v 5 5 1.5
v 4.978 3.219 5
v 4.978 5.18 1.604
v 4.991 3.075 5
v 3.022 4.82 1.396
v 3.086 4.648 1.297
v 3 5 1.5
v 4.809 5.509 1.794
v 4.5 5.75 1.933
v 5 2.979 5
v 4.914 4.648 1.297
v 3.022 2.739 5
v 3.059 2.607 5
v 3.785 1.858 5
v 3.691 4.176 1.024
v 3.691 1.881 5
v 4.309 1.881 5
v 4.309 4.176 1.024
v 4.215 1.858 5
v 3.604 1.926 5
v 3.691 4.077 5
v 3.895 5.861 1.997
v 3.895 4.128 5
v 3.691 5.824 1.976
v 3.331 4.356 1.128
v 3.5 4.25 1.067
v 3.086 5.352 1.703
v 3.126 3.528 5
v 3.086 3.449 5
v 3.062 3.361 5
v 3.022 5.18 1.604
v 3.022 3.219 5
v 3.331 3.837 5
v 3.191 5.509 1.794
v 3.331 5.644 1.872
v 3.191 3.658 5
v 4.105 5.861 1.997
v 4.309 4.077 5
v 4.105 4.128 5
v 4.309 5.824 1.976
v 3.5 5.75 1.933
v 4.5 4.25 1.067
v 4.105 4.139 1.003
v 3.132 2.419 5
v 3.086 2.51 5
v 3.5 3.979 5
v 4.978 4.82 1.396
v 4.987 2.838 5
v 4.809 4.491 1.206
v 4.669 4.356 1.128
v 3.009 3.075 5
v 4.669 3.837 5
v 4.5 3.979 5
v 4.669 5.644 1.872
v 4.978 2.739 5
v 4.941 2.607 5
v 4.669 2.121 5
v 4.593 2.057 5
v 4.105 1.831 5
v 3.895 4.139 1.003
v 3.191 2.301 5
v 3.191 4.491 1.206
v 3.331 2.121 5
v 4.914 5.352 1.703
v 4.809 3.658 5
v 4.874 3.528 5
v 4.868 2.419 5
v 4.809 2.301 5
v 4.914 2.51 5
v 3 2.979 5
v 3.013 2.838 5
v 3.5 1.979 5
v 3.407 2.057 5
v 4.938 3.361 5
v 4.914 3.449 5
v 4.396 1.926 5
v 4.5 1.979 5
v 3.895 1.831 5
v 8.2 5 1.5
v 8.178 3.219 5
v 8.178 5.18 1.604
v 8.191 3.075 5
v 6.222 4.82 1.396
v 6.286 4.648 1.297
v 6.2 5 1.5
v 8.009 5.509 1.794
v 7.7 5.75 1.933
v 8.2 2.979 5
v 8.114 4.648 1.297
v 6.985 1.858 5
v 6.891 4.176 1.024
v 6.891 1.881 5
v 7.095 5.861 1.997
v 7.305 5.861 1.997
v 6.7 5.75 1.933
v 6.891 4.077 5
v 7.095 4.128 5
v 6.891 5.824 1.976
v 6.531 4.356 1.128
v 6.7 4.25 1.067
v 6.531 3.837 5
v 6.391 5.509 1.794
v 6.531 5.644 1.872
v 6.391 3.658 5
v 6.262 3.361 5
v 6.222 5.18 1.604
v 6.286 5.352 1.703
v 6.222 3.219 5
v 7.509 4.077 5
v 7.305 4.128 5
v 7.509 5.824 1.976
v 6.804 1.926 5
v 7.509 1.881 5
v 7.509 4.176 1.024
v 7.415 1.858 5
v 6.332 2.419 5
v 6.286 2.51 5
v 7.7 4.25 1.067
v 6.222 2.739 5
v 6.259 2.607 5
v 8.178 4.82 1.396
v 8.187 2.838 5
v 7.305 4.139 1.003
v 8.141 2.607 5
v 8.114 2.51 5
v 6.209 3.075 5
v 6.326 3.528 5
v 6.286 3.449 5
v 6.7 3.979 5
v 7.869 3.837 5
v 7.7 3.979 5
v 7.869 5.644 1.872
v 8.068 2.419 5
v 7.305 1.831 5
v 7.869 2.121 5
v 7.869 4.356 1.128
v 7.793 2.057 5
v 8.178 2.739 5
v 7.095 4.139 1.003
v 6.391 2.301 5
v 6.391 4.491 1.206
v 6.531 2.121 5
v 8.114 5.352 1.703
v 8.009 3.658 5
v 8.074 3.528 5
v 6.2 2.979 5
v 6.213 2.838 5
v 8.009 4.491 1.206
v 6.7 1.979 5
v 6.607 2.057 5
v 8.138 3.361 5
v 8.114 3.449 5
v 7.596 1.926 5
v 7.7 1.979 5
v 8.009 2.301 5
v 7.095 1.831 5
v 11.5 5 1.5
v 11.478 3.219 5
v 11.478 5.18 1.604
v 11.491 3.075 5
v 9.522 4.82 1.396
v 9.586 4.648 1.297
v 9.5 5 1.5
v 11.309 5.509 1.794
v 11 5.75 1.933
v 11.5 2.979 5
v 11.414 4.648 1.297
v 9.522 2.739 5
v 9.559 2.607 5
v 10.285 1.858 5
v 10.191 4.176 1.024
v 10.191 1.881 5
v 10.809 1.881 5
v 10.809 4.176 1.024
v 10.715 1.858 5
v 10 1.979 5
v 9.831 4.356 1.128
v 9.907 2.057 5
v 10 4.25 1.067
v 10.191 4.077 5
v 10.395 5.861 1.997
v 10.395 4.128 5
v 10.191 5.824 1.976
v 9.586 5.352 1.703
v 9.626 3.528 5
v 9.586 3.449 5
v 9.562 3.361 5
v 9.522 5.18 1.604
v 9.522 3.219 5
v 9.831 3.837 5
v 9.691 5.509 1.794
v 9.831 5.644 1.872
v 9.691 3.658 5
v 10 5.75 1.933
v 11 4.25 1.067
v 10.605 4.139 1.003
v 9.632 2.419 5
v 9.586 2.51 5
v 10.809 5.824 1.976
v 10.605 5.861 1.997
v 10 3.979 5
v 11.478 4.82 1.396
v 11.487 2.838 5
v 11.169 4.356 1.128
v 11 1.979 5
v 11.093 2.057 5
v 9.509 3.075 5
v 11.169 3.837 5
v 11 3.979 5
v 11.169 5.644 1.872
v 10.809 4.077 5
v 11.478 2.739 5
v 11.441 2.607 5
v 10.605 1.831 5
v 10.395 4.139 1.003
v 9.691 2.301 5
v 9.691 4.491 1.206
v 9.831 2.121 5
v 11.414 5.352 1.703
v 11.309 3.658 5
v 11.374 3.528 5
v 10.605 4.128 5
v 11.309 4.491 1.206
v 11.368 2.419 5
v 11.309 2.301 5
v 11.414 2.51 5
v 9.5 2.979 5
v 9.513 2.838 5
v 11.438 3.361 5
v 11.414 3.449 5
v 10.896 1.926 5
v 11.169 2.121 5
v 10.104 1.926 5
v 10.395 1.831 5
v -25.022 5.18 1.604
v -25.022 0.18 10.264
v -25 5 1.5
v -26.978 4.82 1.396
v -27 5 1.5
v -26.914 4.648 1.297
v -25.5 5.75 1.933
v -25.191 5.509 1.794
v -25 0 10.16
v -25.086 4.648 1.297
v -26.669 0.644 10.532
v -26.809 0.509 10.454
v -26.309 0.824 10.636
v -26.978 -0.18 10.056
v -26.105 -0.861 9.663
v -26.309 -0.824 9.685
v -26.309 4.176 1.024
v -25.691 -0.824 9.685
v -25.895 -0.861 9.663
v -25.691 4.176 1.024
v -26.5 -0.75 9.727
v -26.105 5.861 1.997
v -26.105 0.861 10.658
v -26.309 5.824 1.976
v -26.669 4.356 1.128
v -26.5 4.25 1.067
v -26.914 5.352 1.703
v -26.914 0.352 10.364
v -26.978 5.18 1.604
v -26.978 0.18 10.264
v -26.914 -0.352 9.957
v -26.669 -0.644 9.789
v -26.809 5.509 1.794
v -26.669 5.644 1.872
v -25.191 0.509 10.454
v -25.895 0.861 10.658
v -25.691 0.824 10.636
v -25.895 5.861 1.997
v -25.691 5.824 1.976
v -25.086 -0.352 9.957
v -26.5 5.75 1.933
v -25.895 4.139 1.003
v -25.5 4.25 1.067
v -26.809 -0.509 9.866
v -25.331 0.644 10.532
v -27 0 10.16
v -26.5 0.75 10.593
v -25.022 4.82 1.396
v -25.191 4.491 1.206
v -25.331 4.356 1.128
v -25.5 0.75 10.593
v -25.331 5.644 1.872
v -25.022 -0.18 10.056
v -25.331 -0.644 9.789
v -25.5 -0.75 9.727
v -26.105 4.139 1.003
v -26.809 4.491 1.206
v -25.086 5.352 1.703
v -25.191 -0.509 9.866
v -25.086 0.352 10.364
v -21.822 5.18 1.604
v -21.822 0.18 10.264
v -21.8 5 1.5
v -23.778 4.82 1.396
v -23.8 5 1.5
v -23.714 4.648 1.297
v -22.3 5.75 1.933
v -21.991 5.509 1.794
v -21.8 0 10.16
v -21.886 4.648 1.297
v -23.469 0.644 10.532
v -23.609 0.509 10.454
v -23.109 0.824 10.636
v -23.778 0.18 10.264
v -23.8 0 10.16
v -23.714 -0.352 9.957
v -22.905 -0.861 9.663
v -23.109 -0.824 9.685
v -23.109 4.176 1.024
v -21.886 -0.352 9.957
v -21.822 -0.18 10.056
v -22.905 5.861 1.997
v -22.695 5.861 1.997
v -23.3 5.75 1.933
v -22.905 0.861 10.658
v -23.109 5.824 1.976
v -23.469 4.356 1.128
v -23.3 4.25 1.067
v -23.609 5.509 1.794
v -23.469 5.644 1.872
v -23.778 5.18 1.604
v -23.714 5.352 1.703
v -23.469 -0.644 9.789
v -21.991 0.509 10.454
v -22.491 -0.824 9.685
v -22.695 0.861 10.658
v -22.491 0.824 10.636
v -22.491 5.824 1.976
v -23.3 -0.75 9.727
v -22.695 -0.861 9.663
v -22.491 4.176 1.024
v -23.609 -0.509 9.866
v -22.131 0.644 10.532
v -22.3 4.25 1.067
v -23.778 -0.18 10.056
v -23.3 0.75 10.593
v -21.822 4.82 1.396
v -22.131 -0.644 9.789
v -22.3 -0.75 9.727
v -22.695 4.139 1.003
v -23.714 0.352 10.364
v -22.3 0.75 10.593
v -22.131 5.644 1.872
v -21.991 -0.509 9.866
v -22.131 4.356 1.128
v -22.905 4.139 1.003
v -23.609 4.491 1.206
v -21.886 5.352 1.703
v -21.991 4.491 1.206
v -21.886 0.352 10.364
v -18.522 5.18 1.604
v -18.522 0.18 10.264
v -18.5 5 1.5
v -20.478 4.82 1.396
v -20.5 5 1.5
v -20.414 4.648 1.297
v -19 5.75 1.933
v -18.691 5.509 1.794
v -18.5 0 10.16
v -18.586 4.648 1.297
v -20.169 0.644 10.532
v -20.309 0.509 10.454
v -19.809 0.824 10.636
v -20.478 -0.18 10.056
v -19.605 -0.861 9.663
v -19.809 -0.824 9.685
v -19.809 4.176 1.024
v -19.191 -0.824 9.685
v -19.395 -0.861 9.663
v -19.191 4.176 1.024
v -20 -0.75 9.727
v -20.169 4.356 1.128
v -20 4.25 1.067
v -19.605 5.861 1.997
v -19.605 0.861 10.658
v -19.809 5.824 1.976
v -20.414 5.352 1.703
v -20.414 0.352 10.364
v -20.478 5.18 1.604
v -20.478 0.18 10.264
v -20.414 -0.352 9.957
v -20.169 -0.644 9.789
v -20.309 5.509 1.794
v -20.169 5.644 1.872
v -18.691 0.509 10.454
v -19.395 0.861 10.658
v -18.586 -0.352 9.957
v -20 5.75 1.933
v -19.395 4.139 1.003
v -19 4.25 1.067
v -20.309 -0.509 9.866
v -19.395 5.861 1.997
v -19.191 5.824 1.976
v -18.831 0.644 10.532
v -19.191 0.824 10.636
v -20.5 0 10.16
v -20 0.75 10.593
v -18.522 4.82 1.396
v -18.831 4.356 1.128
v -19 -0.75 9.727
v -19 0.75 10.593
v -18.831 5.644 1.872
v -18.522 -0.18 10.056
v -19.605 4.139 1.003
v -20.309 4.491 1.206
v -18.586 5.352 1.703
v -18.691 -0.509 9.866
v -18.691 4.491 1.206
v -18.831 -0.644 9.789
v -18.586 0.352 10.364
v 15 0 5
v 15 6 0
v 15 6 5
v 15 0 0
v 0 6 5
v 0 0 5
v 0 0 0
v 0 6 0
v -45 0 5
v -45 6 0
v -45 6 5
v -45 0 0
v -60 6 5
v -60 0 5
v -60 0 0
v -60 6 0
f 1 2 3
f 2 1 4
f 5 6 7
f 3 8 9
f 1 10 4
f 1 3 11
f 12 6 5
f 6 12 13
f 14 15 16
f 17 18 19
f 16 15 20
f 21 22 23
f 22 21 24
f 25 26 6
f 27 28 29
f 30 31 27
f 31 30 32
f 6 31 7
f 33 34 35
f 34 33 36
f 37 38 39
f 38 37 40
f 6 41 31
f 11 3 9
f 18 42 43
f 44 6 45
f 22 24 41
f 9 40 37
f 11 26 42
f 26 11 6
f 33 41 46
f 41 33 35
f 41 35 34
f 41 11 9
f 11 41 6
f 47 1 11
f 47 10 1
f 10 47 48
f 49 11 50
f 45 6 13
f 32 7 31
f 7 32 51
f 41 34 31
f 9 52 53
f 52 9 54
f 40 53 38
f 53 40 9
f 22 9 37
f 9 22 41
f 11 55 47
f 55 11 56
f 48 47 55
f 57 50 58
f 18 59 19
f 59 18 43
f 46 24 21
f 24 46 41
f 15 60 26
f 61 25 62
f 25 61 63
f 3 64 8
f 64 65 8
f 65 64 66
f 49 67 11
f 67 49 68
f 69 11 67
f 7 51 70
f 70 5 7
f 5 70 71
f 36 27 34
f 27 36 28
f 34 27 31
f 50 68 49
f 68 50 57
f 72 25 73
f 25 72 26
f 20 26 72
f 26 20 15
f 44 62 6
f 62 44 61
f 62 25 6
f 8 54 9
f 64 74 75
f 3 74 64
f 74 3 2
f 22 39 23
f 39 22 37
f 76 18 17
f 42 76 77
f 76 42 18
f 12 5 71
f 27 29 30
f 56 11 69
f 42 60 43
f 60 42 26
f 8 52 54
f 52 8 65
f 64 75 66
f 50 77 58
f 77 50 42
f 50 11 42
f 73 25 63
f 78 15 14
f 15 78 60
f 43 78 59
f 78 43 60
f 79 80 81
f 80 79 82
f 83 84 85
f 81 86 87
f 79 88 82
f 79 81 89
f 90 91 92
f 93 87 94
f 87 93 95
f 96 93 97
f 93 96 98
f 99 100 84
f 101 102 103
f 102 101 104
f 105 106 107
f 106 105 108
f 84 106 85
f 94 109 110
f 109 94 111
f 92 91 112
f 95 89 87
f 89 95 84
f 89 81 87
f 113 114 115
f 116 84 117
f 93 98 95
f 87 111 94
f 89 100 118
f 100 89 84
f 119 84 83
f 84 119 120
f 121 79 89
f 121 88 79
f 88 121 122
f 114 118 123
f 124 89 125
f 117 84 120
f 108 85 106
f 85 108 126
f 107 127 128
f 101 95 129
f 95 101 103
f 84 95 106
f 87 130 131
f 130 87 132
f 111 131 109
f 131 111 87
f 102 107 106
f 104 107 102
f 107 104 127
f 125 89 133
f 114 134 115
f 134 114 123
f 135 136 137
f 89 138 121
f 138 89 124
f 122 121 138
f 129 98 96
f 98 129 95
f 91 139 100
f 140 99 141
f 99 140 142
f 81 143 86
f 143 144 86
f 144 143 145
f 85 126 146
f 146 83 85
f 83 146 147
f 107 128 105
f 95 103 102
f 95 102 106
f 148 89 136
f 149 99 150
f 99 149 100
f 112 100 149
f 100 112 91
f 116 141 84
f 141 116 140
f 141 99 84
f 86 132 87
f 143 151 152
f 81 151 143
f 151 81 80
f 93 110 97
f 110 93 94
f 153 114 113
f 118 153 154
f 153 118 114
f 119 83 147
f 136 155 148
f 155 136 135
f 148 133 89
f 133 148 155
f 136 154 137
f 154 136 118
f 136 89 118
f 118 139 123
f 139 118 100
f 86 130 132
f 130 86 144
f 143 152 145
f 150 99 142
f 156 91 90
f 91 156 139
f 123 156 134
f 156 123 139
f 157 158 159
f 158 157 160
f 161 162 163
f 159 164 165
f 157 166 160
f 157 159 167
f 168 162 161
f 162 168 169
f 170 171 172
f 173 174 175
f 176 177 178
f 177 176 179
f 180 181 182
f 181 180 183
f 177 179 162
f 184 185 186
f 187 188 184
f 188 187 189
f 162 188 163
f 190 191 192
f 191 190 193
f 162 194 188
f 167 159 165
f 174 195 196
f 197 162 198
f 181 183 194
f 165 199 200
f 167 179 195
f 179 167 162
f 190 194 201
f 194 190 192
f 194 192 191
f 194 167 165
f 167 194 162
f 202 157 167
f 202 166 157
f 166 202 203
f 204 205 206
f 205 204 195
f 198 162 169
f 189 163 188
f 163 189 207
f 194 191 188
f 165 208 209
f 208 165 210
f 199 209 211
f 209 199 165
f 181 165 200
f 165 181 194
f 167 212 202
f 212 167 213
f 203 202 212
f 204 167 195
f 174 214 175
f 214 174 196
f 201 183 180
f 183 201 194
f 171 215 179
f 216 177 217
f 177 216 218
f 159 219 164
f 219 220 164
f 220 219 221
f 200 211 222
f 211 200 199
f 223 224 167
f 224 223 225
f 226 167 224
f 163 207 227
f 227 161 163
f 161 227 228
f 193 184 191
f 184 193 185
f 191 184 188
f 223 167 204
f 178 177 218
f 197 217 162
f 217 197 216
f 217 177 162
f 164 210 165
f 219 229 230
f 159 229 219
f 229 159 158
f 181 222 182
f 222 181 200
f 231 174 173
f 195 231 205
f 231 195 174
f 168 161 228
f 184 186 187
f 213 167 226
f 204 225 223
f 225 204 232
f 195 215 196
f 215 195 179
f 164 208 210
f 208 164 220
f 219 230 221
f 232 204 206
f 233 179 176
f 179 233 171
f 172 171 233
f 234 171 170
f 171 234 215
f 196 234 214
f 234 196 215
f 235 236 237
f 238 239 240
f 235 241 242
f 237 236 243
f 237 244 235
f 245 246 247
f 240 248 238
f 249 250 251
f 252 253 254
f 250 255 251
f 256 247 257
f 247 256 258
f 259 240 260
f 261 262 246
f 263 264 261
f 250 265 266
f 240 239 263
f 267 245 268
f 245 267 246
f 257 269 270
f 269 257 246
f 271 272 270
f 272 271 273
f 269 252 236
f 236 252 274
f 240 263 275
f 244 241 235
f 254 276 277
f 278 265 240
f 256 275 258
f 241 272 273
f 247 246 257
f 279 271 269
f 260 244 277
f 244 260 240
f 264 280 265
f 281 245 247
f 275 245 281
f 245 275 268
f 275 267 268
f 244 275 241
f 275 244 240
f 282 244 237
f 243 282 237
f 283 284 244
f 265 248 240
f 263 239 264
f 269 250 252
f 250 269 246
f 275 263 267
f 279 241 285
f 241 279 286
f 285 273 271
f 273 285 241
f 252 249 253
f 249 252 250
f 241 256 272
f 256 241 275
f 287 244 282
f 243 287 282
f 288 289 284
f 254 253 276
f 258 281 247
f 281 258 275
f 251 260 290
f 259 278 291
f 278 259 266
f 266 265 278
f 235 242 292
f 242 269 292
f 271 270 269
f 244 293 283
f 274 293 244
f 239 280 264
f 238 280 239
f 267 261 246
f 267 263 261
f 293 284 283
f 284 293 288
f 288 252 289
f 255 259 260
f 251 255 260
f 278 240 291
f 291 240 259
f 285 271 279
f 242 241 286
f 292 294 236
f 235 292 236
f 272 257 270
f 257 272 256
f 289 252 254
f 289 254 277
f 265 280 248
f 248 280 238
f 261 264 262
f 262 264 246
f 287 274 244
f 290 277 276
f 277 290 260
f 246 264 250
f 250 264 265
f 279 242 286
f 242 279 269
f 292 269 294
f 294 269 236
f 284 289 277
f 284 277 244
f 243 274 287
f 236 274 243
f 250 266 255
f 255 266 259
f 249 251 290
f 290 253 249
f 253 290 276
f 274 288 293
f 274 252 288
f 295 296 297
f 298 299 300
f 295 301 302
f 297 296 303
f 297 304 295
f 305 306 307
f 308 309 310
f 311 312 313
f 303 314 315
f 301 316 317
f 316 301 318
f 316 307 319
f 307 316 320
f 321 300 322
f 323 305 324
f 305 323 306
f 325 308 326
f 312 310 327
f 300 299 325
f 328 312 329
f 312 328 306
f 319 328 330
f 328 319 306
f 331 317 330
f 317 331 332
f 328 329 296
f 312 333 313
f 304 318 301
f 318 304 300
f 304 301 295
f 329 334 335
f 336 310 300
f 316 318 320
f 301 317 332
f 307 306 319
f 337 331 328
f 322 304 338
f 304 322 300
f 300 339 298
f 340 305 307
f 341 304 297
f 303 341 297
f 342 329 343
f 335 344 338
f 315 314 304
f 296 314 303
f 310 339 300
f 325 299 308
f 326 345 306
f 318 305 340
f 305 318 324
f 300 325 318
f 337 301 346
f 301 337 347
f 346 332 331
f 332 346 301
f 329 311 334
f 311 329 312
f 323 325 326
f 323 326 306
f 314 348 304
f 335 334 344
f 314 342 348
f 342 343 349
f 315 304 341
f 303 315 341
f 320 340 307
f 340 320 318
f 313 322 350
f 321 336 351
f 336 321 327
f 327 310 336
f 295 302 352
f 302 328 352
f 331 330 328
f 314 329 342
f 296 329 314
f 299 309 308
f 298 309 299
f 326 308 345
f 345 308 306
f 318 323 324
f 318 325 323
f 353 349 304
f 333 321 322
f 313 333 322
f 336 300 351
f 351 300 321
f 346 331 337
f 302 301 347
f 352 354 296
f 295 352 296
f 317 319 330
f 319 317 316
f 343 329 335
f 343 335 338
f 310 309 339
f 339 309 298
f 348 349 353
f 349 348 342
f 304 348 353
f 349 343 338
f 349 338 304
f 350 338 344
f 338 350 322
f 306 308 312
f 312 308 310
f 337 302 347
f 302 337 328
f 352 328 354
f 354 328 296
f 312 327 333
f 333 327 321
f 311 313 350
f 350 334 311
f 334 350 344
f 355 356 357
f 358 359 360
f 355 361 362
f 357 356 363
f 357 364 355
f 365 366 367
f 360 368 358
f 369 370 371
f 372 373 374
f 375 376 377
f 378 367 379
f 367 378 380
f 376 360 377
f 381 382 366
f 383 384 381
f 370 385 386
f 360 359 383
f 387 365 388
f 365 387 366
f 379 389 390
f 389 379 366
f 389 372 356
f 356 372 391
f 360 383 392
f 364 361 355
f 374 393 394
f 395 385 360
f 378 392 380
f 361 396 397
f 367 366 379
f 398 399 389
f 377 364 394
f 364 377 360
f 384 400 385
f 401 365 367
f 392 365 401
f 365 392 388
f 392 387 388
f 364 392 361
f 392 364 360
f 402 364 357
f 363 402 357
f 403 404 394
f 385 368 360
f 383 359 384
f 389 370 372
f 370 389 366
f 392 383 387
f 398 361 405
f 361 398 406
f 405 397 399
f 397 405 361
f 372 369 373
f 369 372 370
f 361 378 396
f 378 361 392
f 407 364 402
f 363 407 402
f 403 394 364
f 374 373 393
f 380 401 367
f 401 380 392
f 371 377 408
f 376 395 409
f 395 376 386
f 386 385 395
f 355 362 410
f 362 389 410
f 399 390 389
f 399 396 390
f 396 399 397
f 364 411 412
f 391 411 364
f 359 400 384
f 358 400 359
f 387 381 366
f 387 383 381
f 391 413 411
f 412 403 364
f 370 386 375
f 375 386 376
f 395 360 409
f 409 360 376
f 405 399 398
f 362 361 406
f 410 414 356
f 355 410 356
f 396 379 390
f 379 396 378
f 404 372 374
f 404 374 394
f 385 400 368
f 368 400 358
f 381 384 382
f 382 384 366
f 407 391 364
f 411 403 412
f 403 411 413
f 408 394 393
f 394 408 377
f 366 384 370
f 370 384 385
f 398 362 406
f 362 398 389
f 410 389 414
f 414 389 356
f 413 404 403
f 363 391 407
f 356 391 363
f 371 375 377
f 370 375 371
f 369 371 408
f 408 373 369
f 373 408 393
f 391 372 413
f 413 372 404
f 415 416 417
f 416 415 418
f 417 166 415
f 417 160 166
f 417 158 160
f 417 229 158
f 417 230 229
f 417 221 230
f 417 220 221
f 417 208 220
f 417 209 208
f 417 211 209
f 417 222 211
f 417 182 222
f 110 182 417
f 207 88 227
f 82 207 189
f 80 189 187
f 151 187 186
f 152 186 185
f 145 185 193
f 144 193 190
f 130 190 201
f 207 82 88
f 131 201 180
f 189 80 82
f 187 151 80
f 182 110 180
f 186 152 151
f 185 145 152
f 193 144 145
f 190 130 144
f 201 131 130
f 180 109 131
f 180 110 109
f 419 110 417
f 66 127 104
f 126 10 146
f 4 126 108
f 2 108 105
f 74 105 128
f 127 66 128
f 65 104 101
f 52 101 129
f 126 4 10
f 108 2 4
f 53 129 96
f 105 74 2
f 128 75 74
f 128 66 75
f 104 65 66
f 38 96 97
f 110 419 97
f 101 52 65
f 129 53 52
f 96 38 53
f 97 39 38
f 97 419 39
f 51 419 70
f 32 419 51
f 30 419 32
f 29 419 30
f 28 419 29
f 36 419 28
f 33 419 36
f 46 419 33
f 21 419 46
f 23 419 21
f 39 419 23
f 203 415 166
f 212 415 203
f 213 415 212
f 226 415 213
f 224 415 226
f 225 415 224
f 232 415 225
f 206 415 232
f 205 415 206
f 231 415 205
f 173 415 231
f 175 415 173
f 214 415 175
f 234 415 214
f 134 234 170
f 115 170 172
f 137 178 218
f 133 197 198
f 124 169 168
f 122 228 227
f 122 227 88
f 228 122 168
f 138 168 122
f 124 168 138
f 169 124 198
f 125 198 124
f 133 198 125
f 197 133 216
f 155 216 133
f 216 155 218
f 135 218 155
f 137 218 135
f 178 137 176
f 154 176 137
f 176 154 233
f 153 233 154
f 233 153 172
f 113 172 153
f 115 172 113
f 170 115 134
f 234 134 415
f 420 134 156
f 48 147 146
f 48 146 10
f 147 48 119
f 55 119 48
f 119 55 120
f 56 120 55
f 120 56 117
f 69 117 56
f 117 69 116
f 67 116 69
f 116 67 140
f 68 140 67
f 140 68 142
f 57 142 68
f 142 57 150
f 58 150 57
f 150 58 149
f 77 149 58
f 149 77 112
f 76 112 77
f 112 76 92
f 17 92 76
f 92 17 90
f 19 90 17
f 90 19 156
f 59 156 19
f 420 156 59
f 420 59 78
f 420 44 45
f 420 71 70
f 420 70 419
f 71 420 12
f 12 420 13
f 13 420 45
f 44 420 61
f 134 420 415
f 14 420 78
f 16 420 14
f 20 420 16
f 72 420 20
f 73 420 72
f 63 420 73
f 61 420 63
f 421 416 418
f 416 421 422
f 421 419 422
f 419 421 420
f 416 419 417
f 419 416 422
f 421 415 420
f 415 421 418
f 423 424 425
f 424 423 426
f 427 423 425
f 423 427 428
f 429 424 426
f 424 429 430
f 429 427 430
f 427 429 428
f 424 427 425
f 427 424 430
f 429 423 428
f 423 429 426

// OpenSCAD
// block
module block() {
  cube([15, 6, 5]);
}

$fn=30;

// cutouts
module cutouts() {
  // 
  translate([4, 5, 1.5])
  rotate([30, 0, 0])
  cylinder(h=10, d=2.0);

  translate([7.2, 5, 1.5])
  rotate([30, 0, 0])
  cylinder(h=10, d=2.0);

  translate([10.5, 5, 1.5])
  rotate([30, 0, 0])
  cylinder(h=10, d=2.0);    
    
}

translate([-60,0,0])
block();


translate([-30,0,0])
cutouts();

difference() {
  block();
  cutouts();
}



// 
// cube([2,25,25]);
